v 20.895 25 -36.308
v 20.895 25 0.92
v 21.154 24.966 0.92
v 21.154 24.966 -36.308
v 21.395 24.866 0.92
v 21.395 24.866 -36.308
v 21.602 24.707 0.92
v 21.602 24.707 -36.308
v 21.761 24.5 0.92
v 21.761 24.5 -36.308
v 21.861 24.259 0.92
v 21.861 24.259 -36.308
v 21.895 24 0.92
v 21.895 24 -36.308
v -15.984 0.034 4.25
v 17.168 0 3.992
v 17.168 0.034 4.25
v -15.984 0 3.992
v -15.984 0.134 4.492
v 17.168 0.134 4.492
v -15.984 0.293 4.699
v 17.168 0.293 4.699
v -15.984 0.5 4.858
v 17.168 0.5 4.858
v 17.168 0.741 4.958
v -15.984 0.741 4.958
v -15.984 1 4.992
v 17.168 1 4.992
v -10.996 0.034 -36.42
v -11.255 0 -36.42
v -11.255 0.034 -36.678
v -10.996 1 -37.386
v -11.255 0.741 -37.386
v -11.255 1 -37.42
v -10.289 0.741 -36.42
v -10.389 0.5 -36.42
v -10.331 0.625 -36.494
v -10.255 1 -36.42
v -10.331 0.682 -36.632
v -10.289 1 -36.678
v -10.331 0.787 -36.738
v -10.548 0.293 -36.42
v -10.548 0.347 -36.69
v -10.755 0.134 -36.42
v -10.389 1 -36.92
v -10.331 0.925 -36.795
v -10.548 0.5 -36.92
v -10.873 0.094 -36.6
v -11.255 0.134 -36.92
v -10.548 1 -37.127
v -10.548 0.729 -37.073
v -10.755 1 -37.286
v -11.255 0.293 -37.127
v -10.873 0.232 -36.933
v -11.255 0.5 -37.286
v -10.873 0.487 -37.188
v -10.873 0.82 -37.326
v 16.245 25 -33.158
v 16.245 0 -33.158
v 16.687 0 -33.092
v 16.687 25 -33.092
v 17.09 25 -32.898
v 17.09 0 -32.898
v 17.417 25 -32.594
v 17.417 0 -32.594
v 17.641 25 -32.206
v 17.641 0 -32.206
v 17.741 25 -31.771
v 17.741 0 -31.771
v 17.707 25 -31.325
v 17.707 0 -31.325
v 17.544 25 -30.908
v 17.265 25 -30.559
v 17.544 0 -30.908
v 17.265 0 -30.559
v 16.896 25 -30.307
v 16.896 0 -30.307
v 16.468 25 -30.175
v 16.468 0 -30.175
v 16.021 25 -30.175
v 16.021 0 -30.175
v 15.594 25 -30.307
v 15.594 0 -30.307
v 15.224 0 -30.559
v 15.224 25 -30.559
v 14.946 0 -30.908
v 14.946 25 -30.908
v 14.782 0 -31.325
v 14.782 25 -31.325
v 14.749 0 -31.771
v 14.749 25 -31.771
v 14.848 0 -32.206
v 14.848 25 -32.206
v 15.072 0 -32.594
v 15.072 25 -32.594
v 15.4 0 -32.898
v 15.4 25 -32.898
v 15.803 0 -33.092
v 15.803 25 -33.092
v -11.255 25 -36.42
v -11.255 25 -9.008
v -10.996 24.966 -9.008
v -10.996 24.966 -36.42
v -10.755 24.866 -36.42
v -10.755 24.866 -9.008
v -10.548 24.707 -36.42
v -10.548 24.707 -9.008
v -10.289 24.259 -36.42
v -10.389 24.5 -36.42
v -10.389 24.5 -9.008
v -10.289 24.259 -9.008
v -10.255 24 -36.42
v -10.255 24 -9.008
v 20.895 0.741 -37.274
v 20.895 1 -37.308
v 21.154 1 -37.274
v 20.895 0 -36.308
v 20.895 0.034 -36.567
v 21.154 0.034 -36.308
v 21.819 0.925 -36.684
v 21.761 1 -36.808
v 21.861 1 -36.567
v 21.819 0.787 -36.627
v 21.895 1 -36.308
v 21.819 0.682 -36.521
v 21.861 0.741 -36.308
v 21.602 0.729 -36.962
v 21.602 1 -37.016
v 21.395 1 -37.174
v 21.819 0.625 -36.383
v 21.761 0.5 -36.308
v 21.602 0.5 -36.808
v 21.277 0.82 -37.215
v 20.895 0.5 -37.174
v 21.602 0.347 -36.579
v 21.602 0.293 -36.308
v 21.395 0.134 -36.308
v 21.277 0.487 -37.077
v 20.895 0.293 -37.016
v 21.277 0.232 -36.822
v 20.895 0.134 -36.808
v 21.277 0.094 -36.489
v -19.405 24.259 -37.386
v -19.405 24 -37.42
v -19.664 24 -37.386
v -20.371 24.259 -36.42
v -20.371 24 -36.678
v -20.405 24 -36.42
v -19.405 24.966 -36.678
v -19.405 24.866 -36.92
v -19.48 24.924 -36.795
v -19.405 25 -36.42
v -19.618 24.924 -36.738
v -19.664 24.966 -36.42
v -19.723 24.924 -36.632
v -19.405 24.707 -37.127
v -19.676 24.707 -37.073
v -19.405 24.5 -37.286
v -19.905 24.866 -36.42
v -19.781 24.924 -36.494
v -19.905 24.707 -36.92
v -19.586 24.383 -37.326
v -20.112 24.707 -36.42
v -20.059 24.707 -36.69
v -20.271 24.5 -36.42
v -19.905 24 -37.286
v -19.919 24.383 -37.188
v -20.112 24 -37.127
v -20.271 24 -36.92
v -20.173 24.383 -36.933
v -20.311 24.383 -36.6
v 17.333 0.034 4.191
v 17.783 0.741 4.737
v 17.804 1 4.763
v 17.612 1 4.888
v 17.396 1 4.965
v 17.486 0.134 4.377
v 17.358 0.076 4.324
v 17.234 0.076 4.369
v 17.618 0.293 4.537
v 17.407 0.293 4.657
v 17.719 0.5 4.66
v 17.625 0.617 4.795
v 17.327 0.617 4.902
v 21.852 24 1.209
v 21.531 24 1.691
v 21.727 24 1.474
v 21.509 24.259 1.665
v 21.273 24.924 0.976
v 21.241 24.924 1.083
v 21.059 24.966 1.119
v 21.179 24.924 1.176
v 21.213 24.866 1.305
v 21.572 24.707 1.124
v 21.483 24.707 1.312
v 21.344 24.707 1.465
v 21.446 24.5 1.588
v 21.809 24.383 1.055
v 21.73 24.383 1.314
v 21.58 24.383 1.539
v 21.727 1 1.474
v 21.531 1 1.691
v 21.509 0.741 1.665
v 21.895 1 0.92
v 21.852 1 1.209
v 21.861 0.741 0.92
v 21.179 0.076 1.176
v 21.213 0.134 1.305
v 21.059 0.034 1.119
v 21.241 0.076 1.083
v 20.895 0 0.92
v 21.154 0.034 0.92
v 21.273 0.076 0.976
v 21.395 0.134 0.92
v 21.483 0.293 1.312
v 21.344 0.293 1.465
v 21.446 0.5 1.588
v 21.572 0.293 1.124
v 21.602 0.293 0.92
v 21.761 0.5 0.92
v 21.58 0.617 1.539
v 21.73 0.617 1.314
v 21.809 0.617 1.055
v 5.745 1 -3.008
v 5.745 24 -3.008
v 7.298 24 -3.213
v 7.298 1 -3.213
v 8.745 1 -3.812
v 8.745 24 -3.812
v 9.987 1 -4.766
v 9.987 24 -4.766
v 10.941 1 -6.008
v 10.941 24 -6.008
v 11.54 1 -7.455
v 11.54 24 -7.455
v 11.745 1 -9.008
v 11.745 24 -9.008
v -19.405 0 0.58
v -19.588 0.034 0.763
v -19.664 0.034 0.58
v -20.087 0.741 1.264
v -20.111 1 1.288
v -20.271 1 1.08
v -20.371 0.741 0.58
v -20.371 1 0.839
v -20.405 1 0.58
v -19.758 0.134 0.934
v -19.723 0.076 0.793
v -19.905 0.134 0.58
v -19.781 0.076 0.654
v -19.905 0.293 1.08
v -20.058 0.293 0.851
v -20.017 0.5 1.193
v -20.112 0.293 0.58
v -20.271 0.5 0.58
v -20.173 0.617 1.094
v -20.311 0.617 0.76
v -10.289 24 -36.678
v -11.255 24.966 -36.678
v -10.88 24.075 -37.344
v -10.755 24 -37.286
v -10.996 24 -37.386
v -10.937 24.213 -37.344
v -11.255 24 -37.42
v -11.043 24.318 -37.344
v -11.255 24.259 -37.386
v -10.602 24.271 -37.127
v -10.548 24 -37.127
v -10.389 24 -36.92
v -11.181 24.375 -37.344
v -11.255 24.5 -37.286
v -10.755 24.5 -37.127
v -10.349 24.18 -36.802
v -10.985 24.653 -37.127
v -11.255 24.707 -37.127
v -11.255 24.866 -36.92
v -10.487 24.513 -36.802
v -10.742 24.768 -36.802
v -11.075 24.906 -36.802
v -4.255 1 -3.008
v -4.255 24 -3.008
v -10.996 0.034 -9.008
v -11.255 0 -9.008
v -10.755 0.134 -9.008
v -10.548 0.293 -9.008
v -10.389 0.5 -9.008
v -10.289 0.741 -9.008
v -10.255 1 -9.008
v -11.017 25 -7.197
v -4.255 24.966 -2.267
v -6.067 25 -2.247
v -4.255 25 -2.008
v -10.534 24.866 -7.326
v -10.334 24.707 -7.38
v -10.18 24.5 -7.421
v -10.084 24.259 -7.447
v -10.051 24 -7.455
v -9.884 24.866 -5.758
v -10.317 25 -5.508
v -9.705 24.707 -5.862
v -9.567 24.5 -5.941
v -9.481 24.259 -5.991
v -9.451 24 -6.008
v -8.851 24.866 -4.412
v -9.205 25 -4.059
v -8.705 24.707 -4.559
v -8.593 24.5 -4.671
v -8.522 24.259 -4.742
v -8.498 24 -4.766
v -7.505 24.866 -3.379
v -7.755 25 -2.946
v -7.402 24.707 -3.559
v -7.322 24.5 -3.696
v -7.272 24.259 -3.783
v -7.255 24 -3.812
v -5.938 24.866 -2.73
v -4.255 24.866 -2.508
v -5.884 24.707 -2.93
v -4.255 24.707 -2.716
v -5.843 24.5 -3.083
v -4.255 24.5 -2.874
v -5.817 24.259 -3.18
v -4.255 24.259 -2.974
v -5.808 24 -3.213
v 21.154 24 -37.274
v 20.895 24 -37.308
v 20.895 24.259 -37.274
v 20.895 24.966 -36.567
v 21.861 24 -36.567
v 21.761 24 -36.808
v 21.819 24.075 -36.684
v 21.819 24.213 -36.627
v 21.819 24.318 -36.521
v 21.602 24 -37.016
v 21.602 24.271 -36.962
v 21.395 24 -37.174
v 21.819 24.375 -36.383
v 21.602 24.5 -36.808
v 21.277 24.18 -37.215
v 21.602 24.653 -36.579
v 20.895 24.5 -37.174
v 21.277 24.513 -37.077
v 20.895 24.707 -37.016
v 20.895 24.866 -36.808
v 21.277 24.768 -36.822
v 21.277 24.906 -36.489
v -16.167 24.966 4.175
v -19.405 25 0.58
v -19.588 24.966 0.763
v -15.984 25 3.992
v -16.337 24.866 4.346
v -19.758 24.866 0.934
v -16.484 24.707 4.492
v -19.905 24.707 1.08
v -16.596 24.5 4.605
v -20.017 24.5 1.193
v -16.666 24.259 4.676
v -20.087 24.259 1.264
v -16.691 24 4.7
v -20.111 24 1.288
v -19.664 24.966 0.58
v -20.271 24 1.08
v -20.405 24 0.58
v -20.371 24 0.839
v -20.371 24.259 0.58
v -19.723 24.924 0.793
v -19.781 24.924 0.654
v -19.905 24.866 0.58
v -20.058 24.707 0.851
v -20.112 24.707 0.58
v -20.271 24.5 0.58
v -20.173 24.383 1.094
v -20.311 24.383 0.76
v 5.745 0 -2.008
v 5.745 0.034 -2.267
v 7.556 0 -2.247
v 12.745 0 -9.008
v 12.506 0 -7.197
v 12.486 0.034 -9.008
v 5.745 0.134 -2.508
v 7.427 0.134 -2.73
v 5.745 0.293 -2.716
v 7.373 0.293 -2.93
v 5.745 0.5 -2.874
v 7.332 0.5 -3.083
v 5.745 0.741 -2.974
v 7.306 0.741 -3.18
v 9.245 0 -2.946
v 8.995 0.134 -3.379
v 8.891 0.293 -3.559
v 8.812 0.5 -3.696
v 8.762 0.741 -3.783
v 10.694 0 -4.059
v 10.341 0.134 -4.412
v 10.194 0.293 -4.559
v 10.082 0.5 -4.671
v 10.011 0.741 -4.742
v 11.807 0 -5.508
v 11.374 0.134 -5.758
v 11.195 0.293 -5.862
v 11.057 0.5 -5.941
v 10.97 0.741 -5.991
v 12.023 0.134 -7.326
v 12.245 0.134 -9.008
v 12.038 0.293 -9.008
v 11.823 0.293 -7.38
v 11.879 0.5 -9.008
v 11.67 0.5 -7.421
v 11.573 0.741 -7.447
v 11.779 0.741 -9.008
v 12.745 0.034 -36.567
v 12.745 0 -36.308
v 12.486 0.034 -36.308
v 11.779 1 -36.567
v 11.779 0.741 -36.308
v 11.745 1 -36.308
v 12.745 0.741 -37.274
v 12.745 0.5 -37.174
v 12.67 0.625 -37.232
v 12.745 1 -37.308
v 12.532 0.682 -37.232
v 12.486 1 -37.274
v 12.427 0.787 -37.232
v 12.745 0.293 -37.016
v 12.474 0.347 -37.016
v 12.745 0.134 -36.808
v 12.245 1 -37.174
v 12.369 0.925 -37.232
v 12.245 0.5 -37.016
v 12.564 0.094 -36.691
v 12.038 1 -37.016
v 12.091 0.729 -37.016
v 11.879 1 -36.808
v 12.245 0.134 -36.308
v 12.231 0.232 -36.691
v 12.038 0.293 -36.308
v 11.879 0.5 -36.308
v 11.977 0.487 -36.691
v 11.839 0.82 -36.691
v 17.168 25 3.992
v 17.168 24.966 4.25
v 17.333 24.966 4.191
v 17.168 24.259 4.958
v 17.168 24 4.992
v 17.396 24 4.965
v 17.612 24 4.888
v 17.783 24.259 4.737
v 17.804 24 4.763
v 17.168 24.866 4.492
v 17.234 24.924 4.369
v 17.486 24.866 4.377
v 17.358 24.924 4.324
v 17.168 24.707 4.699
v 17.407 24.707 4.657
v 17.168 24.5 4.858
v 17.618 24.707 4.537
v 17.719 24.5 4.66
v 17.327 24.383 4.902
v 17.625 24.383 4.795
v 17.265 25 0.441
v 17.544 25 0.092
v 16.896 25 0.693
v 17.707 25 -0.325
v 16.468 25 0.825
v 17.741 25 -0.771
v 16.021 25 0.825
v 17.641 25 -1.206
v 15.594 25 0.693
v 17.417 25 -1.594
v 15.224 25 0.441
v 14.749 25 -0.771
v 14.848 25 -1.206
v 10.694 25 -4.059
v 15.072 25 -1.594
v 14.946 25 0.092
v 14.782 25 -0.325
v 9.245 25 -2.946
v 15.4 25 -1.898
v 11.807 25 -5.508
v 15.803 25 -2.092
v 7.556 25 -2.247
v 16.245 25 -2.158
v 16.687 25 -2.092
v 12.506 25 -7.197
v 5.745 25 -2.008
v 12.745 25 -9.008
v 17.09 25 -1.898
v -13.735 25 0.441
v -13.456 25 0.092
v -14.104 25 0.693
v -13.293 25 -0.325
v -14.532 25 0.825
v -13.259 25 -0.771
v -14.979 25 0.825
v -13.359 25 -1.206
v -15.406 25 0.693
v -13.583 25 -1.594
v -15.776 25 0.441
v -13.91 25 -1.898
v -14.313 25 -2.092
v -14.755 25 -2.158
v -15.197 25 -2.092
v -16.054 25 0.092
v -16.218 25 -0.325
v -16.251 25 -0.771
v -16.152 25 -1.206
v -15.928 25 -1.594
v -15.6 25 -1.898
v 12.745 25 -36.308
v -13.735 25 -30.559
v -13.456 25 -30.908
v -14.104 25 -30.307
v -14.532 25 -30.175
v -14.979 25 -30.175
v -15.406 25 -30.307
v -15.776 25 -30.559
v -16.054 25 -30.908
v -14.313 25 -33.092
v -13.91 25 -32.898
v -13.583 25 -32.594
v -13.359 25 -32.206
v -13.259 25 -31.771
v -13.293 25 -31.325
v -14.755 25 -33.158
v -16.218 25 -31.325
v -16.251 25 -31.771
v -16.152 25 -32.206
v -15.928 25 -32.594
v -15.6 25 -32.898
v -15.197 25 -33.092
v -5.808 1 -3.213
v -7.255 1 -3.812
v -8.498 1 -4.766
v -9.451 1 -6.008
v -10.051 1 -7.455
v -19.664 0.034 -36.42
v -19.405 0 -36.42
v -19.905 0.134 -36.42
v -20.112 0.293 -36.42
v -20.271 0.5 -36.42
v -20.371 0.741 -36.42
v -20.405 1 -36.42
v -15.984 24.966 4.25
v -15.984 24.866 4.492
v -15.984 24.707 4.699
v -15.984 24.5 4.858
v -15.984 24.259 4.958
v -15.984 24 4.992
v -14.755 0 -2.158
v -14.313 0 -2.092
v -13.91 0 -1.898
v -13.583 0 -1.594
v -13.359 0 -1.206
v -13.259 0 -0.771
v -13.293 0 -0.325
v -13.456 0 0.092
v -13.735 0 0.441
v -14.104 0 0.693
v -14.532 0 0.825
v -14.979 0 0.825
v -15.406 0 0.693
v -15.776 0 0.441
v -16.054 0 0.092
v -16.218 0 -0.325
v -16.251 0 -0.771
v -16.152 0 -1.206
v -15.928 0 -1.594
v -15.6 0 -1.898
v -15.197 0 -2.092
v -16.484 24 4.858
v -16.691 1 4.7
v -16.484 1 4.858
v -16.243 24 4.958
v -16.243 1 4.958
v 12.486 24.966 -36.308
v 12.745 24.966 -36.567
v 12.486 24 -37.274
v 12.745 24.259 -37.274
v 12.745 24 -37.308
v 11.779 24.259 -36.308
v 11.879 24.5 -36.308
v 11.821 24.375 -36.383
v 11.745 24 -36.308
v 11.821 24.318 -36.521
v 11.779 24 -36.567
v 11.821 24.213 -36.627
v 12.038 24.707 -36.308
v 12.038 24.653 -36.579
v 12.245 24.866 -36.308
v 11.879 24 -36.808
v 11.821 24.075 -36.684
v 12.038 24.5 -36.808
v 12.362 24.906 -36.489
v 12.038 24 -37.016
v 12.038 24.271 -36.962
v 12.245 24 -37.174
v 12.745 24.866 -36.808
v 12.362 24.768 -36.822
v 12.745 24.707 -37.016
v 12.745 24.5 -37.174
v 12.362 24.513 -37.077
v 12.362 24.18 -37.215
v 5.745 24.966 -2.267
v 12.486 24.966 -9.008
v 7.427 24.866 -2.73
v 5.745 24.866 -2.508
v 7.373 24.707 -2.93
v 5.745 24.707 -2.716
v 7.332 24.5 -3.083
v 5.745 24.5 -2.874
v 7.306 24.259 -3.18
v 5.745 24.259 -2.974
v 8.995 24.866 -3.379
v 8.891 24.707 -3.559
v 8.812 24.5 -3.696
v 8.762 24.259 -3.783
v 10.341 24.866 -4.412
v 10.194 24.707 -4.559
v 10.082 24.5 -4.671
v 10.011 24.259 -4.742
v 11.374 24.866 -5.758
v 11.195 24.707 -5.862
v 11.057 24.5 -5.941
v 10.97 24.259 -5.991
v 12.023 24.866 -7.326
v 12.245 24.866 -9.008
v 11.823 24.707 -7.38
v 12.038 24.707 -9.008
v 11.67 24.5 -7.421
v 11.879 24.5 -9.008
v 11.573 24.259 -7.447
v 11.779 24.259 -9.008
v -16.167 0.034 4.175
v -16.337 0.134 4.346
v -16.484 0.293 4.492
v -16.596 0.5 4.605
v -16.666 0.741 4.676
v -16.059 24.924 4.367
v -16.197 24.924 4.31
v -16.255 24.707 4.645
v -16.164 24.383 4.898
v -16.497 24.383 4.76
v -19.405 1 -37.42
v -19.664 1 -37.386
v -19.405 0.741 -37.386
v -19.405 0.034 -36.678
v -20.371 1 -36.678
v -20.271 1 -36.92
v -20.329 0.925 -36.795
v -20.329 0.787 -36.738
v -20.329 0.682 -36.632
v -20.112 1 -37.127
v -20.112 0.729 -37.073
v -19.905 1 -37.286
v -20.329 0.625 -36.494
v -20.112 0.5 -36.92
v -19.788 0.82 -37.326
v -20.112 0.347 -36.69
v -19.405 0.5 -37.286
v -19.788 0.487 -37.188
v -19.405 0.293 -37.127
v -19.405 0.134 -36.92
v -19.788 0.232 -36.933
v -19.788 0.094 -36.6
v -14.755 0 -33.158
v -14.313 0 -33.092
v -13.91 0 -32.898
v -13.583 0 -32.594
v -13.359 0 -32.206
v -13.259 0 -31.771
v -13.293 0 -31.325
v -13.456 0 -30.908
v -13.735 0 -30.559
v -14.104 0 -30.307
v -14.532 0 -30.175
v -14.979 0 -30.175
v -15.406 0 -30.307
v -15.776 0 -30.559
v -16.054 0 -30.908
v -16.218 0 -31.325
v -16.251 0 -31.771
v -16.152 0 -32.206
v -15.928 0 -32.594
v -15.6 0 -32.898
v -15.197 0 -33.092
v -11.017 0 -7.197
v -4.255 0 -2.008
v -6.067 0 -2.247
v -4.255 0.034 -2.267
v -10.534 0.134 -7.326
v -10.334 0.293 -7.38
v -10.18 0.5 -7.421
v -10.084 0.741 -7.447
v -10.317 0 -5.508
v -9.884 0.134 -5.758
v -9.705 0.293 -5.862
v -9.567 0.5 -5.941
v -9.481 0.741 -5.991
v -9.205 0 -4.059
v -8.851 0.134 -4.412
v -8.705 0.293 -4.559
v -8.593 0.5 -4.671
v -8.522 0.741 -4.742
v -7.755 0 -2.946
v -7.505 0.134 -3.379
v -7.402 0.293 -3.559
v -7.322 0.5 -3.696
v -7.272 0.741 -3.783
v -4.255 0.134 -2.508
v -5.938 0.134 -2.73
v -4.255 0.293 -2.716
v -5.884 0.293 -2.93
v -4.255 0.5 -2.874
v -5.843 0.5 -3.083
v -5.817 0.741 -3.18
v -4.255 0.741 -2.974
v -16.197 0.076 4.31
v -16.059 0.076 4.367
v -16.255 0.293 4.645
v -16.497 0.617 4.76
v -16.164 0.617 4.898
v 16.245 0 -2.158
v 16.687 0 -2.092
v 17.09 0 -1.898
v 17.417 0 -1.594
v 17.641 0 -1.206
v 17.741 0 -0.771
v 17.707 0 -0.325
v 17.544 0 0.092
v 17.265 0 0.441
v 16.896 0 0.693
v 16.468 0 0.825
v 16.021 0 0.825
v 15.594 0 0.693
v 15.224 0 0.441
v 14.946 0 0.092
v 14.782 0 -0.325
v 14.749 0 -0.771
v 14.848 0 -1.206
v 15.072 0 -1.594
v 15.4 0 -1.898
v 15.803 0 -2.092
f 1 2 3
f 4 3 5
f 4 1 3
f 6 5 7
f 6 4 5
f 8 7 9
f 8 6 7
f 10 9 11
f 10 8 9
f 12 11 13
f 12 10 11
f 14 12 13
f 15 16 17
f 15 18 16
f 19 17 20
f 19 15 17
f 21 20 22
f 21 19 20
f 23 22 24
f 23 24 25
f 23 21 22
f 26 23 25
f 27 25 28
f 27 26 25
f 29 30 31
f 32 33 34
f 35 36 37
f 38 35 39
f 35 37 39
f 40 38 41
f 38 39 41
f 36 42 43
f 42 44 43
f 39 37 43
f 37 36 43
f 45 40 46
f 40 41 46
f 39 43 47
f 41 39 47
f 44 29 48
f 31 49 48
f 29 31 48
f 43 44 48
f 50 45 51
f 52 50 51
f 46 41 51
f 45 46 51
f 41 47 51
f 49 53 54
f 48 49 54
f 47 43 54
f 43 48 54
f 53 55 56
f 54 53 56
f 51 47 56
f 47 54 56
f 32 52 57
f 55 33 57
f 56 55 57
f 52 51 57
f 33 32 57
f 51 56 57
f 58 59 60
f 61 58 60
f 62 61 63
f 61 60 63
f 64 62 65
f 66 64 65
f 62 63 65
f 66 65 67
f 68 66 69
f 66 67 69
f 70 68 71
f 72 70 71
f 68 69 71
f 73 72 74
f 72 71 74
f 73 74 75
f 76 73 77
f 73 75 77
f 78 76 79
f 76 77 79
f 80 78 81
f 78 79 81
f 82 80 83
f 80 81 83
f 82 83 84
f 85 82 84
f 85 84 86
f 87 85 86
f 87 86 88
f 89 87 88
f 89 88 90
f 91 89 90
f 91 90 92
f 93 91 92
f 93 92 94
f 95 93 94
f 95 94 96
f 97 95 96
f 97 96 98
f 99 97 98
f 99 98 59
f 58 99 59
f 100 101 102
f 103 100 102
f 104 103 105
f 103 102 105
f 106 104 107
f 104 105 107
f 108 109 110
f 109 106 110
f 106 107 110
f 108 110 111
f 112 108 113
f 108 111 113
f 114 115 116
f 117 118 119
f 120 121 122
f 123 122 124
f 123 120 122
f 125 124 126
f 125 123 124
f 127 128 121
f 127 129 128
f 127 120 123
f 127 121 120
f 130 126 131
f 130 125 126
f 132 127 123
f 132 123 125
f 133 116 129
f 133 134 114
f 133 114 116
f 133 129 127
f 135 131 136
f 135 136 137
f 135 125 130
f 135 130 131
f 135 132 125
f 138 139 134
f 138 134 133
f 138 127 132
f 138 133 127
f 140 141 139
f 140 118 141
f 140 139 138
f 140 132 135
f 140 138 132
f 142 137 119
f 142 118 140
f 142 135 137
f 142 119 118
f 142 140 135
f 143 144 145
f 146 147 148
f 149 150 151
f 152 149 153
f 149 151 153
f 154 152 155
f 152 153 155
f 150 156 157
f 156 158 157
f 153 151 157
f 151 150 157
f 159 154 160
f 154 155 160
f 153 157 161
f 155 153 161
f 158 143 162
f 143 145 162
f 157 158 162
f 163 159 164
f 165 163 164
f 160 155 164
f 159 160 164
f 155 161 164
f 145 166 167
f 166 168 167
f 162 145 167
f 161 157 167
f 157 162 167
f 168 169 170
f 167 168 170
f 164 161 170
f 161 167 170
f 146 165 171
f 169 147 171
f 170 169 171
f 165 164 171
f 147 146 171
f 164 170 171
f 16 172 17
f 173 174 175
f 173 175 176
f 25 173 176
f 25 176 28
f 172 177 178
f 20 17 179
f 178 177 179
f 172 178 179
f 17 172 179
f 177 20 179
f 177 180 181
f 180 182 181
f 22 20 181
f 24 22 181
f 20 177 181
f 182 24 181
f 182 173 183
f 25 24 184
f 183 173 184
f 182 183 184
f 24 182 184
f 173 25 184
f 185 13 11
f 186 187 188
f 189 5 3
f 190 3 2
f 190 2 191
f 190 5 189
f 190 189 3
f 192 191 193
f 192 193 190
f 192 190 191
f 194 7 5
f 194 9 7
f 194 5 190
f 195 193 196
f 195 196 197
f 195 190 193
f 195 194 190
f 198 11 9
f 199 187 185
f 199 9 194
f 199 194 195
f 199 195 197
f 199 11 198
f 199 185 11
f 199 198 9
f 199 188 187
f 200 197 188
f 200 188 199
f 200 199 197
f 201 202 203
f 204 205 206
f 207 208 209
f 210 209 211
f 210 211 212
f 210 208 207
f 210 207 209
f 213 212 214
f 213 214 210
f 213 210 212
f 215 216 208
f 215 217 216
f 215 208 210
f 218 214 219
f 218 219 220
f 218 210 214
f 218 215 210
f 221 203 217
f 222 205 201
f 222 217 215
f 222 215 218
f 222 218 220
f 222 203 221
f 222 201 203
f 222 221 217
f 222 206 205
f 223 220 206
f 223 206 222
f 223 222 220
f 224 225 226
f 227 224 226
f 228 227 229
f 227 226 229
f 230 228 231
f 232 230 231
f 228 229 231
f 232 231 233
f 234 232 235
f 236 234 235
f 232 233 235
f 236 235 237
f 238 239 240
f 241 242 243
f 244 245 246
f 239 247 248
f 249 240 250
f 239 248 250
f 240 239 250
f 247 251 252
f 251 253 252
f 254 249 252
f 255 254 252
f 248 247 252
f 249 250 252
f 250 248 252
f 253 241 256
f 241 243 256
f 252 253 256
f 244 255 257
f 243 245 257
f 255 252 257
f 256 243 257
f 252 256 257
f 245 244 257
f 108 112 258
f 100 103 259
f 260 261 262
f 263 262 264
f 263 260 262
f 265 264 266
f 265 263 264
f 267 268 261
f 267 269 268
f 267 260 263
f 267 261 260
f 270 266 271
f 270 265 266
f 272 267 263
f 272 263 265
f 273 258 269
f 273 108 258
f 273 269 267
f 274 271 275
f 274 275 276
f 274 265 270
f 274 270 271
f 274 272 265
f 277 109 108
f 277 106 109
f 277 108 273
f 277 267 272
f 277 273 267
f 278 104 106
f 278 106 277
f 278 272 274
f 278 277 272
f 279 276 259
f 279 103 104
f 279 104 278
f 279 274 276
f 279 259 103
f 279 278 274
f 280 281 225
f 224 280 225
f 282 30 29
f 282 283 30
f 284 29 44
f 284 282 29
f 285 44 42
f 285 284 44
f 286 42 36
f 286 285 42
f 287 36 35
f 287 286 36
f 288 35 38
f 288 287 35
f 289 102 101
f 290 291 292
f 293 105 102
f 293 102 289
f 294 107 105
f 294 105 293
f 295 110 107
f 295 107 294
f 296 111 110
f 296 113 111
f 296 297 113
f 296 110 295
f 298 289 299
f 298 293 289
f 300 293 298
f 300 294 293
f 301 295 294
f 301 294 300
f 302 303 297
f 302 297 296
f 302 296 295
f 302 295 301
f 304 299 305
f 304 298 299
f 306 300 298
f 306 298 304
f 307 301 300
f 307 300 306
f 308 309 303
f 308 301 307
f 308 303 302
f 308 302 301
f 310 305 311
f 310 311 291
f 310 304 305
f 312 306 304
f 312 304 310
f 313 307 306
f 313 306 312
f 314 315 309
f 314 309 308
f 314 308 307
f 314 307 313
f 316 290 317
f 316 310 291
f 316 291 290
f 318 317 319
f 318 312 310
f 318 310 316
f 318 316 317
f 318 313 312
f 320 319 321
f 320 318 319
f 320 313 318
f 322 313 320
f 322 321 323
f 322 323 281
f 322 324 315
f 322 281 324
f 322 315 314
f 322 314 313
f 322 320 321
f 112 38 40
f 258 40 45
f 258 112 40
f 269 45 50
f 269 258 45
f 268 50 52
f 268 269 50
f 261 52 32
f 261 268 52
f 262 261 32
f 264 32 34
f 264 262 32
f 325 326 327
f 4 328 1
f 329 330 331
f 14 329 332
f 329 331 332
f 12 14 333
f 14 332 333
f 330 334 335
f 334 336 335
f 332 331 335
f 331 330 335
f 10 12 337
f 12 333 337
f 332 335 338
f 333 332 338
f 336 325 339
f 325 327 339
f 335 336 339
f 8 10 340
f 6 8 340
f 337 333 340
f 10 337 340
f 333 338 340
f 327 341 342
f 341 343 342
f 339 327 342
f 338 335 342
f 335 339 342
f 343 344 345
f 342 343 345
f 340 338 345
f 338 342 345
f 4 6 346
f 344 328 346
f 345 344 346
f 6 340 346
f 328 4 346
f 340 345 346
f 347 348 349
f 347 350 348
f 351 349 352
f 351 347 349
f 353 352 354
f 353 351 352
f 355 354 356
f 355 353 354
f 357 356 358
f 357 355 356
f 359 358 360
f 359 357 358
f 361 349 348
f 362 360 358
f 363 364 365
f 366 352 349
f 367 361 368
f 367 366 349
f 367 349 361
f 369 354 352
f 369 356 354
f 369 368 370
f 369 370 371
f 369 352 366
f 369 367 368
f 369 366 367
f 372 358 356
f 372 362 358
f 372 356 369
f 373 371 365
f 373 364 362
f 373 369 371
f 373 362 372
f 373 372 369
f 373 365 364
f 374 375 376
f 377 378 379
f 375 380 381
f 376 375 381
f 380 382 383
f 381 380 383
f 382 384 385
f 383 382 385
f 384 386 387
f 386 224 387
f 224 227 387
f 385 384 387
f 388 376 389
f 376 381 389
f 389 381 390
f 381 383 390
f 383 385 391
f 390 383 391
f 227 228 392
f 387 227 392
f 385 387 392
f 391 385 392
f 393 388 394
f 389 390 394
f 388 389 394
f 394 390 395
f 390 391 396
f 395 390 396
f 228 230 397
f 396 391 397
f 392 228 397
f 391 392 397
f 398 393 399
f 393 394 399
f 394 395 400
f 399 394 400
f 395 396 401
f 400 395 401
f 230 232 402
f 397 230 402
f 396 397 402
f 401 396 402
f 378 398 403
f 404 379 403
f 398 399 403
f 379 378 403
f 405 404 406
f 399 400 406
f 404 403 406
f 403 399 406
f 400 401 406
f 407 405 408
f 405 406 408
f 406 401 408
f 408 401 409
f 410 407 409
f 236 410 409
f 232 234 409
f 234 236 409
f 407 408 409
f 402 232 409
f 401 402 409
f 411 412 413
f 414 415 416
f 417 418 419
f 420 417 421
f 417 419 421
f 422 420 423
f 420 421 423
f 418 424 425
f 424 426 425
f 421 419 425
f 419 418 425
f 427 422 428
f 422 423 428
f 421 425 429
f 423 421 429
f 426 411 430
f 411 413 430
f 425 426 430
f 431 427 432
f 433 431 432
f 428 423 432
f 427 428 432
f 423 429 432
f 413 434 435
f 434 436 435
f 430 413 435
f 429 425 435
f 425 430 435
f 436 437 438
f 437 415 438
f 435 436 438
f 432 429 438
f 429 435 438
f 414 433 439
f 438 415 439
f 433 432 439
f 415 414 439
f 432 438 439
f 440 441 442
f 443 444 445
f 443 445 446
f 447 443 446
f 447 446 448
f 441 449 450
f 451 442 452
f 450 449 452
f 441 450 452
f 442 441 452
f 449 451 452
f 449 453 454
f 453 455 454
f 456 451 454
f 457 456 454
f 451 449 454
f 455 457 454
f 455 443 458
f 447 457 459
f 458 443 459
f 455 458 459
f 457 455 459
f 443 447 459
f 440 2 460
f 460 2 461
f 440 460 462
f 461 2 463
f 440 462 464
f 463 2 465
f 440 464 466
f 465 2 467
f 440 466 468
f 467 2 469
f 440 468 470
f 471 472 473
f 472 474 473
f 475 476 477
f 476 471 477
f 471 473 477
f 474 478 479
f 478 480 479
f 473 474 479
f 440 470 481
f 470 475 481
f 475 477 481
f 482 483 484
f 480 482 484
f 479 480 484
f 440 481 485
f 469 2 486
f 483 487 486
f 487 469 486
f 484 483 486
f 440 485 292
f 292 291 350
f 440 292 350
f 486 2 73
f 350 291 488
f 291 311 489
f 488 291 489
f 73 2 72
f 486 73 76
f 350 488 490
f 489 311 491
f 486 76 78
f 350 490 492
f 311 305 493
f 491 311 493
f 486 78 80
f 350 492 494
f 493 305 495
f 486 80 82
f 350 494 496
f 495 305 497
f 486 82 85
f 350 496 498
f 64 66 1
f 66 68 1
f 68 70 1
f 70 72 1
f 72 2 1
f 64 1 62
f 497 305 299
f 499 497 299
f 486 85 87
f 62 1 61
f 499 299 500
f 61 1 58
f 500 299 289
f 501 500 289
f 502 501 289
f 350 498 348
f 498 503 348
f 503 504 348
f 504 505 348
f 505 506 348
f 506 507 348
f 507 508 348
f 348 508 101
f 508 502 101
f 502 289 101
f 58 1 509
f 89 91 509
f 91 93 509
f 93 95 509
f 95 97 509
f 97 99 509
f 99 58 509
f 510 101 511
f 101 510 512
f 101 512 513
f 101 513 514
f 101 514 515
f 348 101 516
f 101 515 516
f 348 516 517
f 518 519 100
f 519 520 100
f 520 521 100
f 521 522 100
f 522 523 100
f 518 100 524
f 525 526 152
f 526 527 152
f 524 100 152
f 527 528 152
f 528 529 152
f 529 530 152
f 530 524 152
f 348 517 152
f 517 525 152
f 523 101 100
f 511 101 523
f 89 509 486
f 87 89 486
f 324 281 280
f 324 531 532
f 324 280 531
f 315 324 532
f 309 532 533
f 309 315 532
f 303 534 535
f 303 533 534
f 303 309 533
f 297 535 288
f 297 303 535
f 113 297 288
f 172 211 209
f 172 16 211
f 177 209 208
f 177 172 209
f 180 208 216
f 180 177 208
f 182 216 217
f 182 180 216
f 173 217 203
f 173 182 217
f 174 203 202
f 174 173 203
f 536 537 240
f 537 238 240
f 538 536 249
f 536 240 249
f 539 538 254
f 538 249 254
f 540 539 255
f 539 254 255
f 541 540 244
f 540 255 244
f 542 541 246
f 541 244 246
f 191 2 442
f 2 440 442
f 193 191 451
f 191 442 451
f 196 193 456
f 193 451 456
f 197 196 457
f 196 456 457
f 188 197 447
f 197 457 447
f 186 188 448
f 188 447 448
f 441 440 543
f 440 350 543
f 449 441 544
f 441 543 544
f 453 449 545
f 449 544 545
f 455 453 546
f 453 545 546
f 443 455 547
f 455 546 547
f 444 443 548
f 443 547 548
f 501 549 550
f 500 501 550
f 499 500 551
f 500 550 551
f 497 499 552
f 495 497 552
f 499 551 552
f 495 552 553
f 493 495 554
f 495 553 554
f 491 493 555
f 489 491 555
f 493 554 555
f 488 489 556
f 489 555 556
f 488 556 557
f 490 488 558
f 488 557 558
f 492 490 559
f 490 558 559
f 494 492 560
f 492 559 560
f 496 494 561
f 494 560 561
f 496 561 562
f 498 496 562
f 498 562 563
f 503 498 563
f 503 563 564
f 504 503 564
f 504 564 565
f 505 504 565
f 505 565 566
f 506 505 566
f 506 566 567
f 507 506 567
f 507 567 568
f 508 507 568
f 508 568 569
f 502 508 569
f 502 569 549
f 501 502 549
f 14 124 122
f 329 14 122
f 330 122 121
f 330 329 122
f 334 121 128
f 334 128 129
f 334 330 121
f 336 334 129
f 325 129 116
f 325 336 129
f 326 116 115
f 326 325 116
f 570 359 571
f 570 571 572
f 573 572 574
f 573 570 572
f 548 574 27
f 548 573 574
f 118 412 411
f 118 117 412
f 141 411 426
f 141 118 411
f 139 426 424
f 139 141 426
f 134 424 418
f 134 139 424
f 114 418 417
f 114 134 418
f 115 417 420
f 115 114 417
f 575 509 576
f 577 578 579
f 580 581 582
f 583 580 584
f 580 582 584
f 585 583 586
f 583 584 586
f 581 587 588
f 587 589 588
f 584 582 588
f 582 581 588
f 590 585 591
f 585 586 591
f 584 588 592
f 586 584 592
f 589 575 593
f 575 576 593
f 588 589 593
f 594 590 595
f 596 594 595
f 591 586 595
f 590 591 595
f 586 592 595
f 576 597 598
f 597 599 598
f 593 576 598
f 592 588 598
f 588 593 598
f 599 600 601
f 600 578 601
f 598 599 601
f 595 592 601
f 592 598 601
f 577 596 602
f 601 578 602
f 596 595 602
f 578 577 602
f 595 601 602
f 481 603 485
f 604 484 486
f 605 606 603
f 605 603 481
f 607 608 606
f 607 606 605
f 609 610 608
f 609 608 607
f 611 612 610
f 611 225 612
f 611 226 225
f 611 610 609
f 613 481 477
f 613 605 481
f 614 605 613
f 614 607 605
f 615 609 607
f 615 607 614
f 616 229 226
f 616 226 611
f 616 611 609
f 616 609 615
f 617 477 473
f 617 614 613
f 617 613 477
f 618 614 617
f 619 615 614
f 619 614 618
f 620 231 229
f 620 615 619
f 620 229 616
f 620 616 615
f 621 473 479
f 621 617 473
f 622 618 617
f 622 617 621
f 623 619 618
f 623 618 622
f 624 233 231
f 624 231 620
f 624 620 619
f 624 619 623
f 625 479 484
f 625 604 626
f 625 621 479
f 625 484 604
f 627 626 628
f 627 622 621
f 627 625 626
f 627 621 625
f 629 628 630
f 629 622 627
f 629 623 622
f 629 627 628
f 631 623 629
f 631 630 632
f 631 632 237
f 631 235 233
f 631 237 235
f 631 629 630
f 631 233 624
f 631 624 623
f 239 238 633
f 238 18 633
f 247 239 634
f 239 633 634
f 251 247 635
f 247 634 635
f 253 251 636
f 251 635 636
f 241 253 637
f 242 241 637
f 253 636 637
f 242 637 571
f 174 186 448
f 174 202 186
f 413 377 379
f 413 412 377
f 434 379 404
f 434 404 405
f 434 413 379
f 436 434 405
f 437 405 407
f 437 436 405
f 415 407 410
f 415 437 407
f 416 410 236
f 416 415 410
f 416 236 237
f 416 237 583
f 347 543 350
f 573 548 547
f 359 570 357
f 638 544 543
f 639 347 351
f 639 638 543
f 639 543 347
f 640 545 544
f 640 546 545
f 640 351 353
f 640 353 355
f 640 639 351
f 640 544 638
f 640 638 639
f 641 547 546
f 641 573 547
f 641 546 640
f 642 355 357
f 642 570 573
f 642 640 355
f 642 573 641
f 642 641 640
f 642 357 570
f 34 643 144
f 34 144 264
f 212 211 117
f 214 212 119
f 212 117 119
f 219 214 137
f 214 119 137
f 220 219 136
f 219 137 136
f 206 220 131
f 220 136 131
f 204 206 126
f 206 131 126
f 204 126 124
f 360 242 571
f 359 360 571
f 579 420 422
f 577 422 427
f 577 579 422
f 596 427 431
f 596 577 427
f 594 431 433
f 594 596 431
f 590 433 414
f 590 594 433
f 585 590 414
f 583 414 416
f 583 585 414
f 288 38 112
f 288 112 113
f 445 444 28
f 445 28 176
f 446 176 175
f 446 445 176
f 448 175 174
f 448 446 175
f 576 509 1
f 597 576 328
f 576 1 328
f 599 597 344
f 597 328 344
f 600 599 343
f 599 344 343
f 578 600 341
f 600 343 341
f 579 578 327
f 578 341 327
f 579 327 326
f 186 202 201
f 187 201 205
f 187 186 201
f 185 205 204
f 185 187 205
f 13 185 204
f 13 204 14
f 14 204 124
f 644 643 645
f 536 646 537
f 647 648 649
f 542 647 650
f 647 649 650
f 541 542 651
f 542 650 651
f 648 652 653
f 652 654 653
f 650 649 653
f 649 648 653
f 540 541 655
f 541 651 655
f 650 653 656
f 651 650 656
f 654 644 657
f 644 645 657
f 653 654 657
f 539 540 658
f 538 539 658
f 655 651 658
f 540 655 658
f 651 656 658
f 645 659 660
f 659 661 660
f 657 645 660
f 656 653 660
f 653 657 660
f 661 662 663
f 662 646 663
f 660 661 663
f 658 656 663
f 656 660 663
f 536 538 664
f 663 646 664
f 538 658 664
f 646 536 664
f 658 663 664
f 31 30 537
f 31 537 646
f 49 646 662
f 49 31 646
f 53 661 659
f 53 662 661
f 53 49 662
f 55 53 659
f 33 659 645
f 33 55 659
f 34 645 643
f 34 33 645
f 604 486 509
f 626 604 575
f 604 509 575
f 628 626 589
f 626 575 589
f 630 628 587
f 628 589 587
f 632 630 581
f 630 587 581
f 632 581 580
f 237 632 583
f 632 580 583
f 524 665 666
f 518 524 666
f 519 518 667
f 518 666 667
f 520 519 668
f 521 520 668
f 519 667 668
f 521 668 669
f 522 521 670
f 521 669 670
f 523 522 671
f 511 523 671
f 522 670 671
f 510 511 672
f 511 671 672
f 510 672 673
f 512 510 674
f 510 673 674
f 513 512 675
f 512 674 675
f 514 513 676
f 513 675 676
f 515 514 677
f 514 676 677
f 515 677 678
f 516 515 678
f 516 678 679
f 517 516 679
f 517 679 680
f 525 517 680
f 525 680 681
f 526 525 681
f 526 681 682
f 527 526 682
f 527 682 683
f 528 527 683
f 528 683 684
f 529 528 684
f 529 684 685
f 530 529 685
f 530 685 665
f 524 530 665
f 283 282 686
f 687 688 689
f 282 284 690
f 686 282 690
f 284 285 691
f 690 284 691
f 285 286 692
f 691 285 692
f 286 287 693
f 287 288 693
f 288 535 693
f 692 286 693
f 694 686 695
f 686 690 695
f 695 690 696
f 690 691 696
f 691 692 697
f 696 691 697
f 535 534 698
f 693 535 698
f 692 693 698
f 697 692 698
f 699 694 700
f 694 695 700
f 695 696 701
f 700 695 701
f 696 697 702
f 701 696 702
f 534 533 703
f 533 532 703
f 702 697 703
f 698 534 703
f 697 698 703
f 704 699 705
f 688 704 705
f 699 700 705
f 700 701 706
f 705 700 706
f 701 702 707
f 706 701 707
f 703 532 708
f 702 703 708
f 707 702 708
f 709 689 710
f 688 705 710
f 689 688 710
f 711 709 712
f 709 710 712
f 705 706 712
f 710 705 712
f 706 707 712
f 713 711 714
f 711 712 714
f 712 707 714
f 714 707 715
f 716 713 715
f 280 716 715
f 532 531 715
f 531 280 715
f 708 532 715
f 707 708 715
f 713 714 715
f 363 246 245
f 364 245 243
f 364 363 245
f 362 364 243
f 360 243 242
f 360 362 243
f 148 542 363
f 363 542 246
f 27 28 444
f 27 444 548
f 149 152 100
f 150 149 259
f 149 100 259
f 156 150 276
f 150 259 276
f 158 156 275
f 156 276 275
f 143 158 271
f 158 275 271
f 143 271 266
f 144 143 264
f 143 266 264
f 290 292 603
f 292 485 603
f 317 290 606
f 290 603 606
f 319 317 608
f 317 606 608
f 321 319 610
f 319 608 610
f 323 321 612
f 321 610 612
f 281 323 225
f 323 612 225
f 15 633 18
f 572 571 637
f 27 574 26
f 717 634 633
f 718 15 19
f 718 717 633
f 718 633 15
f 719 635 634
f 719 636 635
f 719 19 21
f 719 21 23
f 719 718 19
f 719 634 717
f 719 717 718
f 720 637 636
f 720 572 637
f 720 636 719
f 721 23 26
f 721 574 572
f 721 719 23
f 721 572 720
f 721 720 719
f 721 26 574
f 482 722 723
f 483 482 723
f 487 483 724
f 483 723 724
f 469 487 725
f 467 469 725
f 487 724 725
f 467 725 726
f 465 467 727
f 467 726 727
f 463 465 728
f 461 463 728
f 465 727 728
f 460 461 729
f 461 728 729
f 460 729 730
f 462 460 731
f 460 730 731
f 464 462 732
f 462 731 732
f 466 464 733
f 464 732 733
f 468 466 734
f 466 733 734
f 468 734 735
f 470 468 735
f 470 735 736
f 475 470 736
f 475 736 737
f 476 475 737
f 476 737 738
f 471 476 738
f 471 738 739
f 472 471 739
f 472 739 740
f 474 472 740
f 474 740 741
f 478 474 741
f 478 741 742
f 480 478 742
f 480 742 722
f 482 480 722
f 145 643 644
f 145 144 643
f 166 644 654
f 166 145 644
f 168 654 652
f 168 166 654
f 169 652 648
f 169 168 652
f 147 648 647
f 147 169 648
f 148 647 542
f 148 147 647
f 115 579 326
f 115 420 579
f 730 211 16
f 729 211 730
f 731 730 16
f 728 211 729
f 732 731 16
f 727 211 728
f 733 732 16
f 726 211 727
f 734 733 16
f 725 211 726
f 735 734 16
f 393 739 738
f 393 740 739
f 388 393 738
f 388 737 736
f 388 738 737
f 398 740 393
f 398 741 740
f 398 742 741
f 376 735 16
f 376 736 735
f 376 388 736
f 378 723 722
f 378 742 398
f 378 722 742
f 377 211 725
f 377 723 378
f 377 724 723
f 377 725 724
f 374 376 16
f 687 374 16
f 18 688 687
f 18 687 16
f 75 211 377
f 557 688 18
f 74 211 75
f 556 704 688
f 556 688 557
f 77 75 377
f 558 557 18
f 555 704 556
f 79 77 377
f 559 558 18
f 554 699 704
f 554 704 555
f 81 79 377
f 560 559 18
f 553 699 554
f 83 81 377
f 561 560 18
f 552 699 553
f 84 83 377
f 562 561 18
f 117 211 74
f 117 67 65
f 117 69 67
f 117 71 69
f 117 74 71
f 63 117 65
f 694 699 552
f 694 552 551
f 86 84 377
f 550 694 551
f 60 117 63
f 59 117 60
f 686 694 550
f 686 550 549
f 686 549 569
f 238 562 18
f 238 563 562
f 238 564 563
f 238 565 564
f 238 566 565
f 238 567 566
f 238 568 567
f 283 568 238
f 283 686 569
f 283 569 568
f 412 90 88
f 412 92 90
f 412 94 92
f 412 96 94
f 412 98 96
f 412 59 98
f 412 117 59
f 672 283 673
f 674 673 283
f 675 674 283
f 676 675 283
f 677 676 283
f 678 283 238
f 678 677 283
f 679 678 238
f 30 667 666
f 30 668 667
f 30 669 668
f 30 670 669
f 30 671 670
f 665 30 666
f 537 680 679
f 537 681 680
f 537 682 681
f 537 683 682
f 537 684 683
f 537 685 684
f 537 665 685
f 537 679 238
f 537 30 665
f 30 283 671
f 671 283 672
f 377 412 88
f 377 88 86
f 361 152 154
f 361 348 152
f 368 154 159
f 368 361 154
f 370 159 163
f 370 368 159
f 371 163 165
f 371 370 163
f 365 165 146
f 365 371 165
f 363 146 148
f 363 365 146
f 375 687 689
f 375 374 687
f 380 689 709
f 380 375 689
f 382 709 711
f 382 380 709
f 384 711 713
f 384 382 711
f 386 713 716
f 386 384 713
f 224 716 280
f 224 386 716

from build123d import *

# Parameters (mm, degrees)
BOSS_EXTRUDE1_DEPTH = 25
SKETCH2_R           = 1.5
CUT_EXTRUDE1_DEPTH  = 51.046074471
FILLET1_R           = 6
CUT_EXTRUDE2_DEPTH  = 51.046074471
FILLET2_R           = 1


with BuildPart() as part:
    # Sketch1 → Boss-Extrude1 (new body)
    with BuildSketch(Plane(origin=(0, 0, 0), x_dir=(1, 0, 0), z_dir=(0, 1, 0))):
        Polygon((-10.255294708, 3.008405172), (11.744705292, 3.008405172), (11.744705292, 37.308405172), (21.894705292, 37.308405172), (21.894705292, 2.897143722), (21.894705292, -4.991594828), (-20.405294708, -4.991594828), (-20.405294708, 3.008405172), (-20.405294708, 37.419666622), (-10.255294708, 37.419666622), align=None)
    extrude(amount=BOSS_EXTRUDE1_DEPTH)

    # Sketch2 → Cut-Extrude1 (cut, through all)
    with BuildSketch(Plane.XZ):
        with Locations(Location((-14.755294708, -31.658405172, 0), (0, 0, 270))):
            Circle(SKETCH2_R)
        with Locations(Location((-14.755294708, -0.658405172, 0), (0, 0, 270))):
            Circle(SKETCH2_R)
        with Locations(Location((16.244705292, -0.658405172, 0), (0, 0, 270))):
            Circle(SKETCH2_R)
        with Locations(Location((16.244705292, -31.658405172, 0), (0, 0, 270))):
            Circle(SKETCH2_R)
    extrude(amount=-CUT_EXTRUDE1_DEPTH, mode=Mode.SUBTRACT)

    # Fillet1
    fillet1_edges = [part.edges().sort_by_distance(p)[0] for p in [
        (-10.255294708, 12.5, -3.008405172),
        (11.744705292, 12.5, -3.008405172),
    ]]
    fillet(fillet1_edges, radius=FILLET1_R)

    # Sketch3 → Cut-Extrude2 (cut, through all)
    with BuildSketch(Plane.XZ):
        Polygon((21.894705292, 1.391259285), (17.527419638, 4.991594828), (21.894705292, 4.991594828), align=None)
        Polygon((-20.405294708, 0.994660971), (-16.397786785, 4.991594828), (-20.405294708, 4.991594828), align=None)
    extrude(amount=-CUT_EXTRUDE2_DEPTH, mode=Mode.SUBTRACT)

    # Fillet2
    fillet2_edges = [part.edges().sort_by_distance(p)[0] for p in [
        (16.819705292, 25, -37.308405172),
        (-15.330294708, 0, -37.419666622),
        (11.744705292, 0, -23.158405172),
        (16.819705292, 0, -37.308405172),
        (11.744705292, 25, -23.158405172),
        (-20.405294708, 12.5, -37.419666622),
        (-10.255294708, 12.5, -37.419666622),
        (11.744705292, 12.5, -37.308405172),
        (21.894705292, 12.5, -37.308405172),
        (-15.330294708, 25, -37.419666622),
        (-20.405294708, 25, -18.212502825),
        (-10.255294708, 0, -23.214035897),
        (-10.255294708, 25, -23.214035897),
        (0.744705292, 0, -3.008405172),
        (0.744705292, 25, -3.008405172),
        (-8.497935395, 0, -4.765764485),
        (-8.497935395, 25, -4.765764485),
        (9.98734598, 0, -4.765764485),
        (9.98734598, 25, -4.765764485),
        (21.894705292, 0, -17.958572944),
        (21.894705292, 25, -17.958572944),
        (19.711062465, 25, 3.191427056),
        (21.894705292, 12.5, 1.391259285),
        (17.527419638, 12.5, 4.991594828),
        (19.711062465, 0, 3.191427056),
        (0.564816427, 0, 4.991594828),
        (0.564816427, 25, 4.991594828),
        (-20.405294708, 12.5, 0.994660971),
        (-18.401540746, 25, 2.993127899),
        (-16.397786785, 12.5, 4.991594828),
        (-18.401540746, 0, 2.993127899),
        (-20.405294708, 0, -18.212502825),
    ]]
    fillet(fillet2_edges, radius=FILLET2_R)


solid = part.part
